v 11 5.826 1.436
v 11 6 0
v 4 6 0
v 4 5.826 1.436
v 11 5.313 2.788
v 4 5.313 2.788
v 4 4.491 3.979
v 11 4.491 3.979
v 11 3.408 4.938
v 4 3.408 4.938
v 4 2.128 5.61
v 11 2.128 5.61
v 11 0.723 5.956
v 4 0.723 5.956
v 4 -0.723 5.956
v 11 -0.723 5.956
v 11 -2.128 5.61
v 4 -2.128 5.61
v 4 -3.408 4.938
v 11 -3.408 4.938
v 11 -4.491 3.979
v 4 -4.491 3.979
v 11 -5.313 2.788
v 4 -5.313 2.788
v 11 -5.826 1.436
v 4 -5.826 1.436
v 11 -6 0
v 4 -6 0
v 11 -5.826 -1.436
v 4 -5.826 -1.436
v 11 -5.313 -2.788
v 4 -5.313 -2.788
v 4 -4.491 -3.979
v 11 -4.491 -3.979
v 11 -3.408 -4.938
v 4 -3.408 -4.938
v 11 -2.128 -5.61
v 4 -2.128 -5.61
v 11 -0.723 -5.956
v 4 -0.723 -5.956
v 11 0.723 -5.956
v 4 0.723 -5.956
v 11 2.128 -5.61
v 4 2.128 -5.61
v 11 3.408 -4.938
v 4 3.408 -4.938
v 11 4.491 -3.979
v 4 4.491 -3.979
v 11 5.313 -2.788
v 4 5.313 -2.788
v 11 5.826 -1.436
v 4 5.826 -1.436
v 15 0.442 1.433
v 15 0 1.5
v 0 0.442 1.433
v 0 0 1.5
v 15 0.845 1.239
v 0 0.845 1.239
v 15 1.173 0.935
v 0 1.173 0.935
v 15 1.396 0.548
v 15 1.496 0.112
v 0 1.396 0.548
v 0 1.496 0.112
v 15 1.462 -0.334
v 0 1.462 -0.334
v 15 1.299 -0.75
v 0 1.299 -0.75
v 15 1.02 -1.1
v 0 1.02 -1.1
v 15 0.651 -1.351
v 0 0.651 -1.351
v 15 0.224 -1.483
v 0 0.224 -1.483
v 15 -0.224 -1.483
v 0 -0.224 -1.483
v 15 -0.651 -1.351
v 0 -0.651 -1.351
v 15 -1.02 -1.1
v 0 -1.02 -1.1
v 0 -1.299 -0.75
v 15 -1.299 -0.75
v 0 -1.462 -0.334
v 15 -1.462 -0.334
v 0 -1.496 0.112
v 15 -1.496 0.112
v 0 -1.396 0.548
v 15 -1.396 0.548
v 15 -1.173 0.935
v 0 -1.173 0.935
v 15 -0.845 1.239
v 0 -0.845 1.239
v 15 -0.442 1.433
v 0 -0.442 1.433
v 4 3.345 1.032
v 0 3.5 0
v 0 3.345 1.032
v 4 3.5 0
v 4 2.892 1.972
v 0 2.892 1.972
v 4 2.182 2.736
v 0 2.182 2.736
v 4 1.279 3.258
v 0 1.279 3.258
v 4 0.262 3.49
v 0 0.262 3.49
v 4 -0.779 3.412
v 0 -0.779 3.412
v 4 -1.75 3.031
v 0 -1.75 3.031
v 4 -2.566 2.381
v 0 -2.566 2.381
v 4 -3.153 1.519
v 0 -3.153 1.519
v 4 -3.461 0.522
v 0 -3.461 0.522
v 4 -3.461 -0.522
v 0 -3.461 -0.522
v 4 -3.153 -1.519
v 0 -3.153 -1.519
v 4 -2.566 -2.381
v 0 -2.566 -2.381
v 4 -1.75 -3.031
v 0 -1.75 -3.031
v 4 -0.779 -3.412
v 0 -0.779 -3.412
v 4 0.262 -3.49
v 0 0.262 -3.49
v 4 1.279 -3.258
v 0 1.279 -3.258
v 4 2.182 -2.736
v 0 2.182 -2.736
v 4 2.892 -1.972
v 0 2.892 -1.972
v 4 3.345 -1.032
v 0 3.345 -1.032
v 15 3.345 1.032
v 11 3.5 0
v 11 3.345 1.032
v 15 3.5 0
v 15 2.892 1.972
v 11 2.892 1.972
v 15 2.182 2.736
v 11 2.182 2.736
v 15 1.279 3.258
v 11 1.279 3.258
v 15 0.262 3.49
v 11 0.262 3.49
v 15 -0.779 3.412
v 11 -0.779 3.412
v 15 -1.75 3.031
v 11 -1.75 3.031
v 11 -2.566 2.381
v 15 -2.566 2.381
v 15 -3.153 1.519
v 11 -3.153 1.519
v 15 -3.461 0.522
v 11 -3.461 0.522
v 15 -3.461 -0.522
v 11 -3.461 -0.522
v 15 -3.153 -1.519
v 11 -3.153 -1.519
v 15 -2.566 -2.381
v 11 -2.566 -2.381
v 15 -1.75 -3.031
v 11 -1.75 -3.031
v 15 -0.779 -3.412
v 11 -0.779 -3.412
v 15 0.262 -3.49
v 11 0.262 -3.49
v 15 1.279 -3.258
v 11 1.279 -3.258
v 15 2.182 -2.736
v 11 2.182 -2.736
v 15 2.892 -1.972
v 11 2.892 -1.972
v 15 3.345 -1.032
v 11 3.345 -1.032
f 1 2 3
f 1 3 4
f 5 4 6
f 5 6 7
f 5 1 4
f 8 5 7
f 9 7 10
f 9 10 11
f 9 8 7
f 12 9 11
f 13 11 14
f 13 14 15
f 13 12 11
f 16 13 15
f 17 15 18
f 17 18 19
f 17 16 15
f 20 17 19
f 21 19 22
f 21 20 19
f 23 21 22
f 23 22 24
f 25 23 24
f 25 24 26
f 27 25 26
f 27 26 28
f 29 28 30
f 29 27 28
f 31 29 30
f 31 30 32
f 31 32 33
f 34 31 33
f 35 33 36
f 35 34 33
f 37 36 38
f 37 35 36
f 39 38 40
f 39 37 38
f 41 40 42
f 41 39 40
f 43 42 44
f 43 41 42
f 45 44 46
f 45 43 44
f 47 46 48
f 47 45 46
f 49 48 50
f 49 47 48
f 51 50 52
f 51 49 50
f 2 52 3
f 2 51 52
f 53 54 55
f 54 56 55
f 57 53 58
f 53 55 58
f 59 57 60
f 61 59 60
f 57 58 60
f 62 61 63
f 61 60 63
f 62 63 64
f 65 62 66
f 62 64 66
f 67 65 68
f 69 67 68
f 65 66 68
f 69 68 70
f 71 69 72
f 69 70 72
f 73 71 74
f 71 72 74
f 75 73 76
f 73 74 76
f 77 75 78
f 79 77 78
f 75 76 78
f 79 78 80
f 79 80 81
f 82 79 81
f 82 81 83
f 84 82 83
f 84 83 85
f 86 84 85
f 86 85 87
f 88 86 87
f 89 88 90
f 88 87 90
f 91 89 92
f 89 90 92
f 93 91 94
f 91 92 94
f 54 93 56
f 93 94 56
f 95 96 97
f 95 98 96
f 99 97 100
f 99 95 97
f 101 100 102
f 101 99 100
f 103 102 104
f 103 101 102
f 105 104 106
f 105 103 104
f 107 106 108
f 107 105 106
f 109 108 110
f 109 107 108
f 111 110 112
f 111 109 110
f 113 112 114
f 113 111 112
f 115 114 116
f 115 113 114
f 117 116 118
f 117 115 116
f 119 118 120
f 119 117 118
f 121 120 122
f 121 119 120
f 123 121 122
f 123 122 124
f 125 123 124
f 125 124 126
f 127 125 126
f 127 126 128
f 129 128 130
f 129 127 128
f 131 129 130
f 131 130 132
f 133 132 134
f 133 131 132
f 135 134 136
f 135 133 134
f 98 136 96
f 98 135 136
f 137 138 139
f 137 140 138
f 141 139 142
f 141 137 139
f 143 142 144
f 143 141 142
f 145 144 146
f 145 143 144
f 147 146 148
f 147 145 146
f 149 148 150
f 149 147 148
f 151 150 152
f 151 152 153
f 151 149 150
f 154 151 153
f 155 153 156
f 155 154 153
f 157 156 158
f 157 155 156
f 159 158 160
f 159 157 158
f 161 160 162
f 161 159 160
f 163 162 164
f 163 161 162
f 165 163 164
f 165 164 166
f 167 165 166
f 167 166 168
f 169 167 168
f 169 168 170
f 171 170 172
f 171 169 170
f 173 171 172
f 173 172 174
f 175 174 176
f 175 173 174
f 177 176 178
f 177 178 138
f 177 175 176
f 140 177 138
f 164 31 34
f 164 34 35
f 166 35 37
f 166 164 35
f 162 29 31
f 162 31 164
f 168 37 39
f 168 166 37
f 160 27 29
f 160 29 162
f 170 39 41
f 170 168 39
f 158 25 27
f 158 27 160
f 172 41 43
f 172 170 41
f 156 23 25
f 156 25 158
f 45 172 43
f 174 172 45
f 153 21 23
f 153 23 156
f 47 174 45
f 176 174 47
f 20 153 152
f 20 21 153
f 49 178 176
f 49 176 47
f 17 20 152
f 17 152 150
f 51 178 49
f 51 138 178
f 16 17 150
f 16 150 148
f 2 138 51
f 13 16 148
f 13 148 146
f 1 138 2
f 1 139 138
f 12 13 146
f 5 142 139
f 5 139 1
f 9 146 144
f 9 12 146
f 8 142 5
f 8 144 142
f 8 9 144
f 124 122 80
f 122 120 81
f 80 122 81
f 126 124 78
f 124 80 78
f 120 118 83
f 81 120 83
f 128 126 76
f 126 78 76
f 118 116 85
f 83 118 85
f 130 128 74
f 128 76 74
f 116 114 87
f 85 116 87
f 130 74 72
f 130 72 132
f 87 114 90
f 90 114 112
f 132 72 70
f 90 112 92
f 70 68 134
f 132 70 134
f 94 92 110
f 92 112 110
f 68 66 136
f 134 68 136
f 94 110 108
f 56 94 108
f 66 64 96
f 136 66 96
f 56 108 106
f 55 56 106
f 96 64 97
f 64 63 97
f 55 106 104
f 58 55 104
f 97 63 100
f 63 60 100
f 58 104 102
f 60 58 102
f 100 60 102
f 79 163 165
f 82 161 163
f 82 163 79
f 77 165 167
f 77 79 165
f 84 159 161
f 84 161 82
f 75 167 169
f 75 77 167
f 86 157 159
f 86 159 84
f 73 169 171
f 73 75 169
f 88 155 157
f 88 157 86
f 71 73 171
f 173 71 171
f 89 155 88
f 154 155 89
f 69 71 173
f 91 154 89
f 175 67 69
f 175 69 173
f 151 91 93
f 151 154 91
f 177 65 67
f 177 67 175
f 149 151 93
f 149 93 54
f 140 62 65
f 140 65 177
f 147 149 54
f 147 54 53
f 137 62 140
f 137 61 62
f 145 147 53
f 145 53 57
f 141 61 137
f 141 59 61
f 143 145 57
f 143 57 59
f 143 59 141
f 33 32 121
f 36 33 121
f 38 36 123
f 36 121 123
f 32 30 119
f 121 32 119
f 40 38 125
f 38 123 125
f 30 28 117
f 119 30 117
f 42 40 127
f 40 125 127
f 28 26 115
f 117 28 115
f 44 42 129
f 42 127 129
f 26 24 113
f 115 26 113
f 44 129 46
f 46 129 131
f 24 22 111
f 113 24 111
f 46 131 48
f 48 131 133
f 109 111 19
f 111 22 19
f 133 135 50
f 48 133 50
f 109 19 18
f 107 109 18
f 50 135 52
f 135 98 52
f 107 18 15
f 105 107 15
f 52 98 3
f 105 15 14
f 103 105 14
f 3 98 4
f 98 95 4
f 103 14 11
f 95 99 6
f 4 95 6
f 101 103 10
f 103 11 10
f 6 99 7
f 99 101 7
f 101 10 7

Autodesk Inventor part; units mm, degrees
ref_plane "Start Plane" through (0, 0, 0) normal (1, 0, 0) x (0, 1, 0)
ref_plane "XZ Plane" through (0, 0, 0) normal (0, 1, 0) x (-1, 0, 0)
ref_plane "XY Plane" through (0, 0, 0) normal (0, 0, 1) x (1, 0, 0)
sketch "Main Sketch" plane through (0, 0, 0) normal (0, 0, 1) x (1, 0, 0)
  line L0 (0, 0) -> (15, 0)
  line L1 (0, 0) -> (0, 3.5)
  line L2 (0, 3.5) -> (4, 3.5)
  line L3 (4, 3.5) -> (4, 6)
  line L4 (11, 6) -> (11, 3.5)
  line L5 (4, 6) -> (11, 6)
  line L6 (15, 3.5) -> (15, 0)
  line L7 (11, 3.5) -> (15, 3.5)
  dimension "d3" = 7
  dimension "d4" = 12
  dimension "d5" = 7
revolve "Revolution1" add sketch "Main Sketch" angle 360 about axis through (0, 0, 0) along (1, 0, 0)
sketch "Sketch3" plane through (0, 0, 0) normal (-1, 0, 0) x (0, 0, 1)
  circle A0 centre (0, 0) radius 1.5
  dimension "d7" = 3
extrude "Extrusion1" cut sketch "Sketch3" against normal up to surface (15 mm away)
equation "\"Length\" = 15"
properties part number "Shaft" material "Steel"
